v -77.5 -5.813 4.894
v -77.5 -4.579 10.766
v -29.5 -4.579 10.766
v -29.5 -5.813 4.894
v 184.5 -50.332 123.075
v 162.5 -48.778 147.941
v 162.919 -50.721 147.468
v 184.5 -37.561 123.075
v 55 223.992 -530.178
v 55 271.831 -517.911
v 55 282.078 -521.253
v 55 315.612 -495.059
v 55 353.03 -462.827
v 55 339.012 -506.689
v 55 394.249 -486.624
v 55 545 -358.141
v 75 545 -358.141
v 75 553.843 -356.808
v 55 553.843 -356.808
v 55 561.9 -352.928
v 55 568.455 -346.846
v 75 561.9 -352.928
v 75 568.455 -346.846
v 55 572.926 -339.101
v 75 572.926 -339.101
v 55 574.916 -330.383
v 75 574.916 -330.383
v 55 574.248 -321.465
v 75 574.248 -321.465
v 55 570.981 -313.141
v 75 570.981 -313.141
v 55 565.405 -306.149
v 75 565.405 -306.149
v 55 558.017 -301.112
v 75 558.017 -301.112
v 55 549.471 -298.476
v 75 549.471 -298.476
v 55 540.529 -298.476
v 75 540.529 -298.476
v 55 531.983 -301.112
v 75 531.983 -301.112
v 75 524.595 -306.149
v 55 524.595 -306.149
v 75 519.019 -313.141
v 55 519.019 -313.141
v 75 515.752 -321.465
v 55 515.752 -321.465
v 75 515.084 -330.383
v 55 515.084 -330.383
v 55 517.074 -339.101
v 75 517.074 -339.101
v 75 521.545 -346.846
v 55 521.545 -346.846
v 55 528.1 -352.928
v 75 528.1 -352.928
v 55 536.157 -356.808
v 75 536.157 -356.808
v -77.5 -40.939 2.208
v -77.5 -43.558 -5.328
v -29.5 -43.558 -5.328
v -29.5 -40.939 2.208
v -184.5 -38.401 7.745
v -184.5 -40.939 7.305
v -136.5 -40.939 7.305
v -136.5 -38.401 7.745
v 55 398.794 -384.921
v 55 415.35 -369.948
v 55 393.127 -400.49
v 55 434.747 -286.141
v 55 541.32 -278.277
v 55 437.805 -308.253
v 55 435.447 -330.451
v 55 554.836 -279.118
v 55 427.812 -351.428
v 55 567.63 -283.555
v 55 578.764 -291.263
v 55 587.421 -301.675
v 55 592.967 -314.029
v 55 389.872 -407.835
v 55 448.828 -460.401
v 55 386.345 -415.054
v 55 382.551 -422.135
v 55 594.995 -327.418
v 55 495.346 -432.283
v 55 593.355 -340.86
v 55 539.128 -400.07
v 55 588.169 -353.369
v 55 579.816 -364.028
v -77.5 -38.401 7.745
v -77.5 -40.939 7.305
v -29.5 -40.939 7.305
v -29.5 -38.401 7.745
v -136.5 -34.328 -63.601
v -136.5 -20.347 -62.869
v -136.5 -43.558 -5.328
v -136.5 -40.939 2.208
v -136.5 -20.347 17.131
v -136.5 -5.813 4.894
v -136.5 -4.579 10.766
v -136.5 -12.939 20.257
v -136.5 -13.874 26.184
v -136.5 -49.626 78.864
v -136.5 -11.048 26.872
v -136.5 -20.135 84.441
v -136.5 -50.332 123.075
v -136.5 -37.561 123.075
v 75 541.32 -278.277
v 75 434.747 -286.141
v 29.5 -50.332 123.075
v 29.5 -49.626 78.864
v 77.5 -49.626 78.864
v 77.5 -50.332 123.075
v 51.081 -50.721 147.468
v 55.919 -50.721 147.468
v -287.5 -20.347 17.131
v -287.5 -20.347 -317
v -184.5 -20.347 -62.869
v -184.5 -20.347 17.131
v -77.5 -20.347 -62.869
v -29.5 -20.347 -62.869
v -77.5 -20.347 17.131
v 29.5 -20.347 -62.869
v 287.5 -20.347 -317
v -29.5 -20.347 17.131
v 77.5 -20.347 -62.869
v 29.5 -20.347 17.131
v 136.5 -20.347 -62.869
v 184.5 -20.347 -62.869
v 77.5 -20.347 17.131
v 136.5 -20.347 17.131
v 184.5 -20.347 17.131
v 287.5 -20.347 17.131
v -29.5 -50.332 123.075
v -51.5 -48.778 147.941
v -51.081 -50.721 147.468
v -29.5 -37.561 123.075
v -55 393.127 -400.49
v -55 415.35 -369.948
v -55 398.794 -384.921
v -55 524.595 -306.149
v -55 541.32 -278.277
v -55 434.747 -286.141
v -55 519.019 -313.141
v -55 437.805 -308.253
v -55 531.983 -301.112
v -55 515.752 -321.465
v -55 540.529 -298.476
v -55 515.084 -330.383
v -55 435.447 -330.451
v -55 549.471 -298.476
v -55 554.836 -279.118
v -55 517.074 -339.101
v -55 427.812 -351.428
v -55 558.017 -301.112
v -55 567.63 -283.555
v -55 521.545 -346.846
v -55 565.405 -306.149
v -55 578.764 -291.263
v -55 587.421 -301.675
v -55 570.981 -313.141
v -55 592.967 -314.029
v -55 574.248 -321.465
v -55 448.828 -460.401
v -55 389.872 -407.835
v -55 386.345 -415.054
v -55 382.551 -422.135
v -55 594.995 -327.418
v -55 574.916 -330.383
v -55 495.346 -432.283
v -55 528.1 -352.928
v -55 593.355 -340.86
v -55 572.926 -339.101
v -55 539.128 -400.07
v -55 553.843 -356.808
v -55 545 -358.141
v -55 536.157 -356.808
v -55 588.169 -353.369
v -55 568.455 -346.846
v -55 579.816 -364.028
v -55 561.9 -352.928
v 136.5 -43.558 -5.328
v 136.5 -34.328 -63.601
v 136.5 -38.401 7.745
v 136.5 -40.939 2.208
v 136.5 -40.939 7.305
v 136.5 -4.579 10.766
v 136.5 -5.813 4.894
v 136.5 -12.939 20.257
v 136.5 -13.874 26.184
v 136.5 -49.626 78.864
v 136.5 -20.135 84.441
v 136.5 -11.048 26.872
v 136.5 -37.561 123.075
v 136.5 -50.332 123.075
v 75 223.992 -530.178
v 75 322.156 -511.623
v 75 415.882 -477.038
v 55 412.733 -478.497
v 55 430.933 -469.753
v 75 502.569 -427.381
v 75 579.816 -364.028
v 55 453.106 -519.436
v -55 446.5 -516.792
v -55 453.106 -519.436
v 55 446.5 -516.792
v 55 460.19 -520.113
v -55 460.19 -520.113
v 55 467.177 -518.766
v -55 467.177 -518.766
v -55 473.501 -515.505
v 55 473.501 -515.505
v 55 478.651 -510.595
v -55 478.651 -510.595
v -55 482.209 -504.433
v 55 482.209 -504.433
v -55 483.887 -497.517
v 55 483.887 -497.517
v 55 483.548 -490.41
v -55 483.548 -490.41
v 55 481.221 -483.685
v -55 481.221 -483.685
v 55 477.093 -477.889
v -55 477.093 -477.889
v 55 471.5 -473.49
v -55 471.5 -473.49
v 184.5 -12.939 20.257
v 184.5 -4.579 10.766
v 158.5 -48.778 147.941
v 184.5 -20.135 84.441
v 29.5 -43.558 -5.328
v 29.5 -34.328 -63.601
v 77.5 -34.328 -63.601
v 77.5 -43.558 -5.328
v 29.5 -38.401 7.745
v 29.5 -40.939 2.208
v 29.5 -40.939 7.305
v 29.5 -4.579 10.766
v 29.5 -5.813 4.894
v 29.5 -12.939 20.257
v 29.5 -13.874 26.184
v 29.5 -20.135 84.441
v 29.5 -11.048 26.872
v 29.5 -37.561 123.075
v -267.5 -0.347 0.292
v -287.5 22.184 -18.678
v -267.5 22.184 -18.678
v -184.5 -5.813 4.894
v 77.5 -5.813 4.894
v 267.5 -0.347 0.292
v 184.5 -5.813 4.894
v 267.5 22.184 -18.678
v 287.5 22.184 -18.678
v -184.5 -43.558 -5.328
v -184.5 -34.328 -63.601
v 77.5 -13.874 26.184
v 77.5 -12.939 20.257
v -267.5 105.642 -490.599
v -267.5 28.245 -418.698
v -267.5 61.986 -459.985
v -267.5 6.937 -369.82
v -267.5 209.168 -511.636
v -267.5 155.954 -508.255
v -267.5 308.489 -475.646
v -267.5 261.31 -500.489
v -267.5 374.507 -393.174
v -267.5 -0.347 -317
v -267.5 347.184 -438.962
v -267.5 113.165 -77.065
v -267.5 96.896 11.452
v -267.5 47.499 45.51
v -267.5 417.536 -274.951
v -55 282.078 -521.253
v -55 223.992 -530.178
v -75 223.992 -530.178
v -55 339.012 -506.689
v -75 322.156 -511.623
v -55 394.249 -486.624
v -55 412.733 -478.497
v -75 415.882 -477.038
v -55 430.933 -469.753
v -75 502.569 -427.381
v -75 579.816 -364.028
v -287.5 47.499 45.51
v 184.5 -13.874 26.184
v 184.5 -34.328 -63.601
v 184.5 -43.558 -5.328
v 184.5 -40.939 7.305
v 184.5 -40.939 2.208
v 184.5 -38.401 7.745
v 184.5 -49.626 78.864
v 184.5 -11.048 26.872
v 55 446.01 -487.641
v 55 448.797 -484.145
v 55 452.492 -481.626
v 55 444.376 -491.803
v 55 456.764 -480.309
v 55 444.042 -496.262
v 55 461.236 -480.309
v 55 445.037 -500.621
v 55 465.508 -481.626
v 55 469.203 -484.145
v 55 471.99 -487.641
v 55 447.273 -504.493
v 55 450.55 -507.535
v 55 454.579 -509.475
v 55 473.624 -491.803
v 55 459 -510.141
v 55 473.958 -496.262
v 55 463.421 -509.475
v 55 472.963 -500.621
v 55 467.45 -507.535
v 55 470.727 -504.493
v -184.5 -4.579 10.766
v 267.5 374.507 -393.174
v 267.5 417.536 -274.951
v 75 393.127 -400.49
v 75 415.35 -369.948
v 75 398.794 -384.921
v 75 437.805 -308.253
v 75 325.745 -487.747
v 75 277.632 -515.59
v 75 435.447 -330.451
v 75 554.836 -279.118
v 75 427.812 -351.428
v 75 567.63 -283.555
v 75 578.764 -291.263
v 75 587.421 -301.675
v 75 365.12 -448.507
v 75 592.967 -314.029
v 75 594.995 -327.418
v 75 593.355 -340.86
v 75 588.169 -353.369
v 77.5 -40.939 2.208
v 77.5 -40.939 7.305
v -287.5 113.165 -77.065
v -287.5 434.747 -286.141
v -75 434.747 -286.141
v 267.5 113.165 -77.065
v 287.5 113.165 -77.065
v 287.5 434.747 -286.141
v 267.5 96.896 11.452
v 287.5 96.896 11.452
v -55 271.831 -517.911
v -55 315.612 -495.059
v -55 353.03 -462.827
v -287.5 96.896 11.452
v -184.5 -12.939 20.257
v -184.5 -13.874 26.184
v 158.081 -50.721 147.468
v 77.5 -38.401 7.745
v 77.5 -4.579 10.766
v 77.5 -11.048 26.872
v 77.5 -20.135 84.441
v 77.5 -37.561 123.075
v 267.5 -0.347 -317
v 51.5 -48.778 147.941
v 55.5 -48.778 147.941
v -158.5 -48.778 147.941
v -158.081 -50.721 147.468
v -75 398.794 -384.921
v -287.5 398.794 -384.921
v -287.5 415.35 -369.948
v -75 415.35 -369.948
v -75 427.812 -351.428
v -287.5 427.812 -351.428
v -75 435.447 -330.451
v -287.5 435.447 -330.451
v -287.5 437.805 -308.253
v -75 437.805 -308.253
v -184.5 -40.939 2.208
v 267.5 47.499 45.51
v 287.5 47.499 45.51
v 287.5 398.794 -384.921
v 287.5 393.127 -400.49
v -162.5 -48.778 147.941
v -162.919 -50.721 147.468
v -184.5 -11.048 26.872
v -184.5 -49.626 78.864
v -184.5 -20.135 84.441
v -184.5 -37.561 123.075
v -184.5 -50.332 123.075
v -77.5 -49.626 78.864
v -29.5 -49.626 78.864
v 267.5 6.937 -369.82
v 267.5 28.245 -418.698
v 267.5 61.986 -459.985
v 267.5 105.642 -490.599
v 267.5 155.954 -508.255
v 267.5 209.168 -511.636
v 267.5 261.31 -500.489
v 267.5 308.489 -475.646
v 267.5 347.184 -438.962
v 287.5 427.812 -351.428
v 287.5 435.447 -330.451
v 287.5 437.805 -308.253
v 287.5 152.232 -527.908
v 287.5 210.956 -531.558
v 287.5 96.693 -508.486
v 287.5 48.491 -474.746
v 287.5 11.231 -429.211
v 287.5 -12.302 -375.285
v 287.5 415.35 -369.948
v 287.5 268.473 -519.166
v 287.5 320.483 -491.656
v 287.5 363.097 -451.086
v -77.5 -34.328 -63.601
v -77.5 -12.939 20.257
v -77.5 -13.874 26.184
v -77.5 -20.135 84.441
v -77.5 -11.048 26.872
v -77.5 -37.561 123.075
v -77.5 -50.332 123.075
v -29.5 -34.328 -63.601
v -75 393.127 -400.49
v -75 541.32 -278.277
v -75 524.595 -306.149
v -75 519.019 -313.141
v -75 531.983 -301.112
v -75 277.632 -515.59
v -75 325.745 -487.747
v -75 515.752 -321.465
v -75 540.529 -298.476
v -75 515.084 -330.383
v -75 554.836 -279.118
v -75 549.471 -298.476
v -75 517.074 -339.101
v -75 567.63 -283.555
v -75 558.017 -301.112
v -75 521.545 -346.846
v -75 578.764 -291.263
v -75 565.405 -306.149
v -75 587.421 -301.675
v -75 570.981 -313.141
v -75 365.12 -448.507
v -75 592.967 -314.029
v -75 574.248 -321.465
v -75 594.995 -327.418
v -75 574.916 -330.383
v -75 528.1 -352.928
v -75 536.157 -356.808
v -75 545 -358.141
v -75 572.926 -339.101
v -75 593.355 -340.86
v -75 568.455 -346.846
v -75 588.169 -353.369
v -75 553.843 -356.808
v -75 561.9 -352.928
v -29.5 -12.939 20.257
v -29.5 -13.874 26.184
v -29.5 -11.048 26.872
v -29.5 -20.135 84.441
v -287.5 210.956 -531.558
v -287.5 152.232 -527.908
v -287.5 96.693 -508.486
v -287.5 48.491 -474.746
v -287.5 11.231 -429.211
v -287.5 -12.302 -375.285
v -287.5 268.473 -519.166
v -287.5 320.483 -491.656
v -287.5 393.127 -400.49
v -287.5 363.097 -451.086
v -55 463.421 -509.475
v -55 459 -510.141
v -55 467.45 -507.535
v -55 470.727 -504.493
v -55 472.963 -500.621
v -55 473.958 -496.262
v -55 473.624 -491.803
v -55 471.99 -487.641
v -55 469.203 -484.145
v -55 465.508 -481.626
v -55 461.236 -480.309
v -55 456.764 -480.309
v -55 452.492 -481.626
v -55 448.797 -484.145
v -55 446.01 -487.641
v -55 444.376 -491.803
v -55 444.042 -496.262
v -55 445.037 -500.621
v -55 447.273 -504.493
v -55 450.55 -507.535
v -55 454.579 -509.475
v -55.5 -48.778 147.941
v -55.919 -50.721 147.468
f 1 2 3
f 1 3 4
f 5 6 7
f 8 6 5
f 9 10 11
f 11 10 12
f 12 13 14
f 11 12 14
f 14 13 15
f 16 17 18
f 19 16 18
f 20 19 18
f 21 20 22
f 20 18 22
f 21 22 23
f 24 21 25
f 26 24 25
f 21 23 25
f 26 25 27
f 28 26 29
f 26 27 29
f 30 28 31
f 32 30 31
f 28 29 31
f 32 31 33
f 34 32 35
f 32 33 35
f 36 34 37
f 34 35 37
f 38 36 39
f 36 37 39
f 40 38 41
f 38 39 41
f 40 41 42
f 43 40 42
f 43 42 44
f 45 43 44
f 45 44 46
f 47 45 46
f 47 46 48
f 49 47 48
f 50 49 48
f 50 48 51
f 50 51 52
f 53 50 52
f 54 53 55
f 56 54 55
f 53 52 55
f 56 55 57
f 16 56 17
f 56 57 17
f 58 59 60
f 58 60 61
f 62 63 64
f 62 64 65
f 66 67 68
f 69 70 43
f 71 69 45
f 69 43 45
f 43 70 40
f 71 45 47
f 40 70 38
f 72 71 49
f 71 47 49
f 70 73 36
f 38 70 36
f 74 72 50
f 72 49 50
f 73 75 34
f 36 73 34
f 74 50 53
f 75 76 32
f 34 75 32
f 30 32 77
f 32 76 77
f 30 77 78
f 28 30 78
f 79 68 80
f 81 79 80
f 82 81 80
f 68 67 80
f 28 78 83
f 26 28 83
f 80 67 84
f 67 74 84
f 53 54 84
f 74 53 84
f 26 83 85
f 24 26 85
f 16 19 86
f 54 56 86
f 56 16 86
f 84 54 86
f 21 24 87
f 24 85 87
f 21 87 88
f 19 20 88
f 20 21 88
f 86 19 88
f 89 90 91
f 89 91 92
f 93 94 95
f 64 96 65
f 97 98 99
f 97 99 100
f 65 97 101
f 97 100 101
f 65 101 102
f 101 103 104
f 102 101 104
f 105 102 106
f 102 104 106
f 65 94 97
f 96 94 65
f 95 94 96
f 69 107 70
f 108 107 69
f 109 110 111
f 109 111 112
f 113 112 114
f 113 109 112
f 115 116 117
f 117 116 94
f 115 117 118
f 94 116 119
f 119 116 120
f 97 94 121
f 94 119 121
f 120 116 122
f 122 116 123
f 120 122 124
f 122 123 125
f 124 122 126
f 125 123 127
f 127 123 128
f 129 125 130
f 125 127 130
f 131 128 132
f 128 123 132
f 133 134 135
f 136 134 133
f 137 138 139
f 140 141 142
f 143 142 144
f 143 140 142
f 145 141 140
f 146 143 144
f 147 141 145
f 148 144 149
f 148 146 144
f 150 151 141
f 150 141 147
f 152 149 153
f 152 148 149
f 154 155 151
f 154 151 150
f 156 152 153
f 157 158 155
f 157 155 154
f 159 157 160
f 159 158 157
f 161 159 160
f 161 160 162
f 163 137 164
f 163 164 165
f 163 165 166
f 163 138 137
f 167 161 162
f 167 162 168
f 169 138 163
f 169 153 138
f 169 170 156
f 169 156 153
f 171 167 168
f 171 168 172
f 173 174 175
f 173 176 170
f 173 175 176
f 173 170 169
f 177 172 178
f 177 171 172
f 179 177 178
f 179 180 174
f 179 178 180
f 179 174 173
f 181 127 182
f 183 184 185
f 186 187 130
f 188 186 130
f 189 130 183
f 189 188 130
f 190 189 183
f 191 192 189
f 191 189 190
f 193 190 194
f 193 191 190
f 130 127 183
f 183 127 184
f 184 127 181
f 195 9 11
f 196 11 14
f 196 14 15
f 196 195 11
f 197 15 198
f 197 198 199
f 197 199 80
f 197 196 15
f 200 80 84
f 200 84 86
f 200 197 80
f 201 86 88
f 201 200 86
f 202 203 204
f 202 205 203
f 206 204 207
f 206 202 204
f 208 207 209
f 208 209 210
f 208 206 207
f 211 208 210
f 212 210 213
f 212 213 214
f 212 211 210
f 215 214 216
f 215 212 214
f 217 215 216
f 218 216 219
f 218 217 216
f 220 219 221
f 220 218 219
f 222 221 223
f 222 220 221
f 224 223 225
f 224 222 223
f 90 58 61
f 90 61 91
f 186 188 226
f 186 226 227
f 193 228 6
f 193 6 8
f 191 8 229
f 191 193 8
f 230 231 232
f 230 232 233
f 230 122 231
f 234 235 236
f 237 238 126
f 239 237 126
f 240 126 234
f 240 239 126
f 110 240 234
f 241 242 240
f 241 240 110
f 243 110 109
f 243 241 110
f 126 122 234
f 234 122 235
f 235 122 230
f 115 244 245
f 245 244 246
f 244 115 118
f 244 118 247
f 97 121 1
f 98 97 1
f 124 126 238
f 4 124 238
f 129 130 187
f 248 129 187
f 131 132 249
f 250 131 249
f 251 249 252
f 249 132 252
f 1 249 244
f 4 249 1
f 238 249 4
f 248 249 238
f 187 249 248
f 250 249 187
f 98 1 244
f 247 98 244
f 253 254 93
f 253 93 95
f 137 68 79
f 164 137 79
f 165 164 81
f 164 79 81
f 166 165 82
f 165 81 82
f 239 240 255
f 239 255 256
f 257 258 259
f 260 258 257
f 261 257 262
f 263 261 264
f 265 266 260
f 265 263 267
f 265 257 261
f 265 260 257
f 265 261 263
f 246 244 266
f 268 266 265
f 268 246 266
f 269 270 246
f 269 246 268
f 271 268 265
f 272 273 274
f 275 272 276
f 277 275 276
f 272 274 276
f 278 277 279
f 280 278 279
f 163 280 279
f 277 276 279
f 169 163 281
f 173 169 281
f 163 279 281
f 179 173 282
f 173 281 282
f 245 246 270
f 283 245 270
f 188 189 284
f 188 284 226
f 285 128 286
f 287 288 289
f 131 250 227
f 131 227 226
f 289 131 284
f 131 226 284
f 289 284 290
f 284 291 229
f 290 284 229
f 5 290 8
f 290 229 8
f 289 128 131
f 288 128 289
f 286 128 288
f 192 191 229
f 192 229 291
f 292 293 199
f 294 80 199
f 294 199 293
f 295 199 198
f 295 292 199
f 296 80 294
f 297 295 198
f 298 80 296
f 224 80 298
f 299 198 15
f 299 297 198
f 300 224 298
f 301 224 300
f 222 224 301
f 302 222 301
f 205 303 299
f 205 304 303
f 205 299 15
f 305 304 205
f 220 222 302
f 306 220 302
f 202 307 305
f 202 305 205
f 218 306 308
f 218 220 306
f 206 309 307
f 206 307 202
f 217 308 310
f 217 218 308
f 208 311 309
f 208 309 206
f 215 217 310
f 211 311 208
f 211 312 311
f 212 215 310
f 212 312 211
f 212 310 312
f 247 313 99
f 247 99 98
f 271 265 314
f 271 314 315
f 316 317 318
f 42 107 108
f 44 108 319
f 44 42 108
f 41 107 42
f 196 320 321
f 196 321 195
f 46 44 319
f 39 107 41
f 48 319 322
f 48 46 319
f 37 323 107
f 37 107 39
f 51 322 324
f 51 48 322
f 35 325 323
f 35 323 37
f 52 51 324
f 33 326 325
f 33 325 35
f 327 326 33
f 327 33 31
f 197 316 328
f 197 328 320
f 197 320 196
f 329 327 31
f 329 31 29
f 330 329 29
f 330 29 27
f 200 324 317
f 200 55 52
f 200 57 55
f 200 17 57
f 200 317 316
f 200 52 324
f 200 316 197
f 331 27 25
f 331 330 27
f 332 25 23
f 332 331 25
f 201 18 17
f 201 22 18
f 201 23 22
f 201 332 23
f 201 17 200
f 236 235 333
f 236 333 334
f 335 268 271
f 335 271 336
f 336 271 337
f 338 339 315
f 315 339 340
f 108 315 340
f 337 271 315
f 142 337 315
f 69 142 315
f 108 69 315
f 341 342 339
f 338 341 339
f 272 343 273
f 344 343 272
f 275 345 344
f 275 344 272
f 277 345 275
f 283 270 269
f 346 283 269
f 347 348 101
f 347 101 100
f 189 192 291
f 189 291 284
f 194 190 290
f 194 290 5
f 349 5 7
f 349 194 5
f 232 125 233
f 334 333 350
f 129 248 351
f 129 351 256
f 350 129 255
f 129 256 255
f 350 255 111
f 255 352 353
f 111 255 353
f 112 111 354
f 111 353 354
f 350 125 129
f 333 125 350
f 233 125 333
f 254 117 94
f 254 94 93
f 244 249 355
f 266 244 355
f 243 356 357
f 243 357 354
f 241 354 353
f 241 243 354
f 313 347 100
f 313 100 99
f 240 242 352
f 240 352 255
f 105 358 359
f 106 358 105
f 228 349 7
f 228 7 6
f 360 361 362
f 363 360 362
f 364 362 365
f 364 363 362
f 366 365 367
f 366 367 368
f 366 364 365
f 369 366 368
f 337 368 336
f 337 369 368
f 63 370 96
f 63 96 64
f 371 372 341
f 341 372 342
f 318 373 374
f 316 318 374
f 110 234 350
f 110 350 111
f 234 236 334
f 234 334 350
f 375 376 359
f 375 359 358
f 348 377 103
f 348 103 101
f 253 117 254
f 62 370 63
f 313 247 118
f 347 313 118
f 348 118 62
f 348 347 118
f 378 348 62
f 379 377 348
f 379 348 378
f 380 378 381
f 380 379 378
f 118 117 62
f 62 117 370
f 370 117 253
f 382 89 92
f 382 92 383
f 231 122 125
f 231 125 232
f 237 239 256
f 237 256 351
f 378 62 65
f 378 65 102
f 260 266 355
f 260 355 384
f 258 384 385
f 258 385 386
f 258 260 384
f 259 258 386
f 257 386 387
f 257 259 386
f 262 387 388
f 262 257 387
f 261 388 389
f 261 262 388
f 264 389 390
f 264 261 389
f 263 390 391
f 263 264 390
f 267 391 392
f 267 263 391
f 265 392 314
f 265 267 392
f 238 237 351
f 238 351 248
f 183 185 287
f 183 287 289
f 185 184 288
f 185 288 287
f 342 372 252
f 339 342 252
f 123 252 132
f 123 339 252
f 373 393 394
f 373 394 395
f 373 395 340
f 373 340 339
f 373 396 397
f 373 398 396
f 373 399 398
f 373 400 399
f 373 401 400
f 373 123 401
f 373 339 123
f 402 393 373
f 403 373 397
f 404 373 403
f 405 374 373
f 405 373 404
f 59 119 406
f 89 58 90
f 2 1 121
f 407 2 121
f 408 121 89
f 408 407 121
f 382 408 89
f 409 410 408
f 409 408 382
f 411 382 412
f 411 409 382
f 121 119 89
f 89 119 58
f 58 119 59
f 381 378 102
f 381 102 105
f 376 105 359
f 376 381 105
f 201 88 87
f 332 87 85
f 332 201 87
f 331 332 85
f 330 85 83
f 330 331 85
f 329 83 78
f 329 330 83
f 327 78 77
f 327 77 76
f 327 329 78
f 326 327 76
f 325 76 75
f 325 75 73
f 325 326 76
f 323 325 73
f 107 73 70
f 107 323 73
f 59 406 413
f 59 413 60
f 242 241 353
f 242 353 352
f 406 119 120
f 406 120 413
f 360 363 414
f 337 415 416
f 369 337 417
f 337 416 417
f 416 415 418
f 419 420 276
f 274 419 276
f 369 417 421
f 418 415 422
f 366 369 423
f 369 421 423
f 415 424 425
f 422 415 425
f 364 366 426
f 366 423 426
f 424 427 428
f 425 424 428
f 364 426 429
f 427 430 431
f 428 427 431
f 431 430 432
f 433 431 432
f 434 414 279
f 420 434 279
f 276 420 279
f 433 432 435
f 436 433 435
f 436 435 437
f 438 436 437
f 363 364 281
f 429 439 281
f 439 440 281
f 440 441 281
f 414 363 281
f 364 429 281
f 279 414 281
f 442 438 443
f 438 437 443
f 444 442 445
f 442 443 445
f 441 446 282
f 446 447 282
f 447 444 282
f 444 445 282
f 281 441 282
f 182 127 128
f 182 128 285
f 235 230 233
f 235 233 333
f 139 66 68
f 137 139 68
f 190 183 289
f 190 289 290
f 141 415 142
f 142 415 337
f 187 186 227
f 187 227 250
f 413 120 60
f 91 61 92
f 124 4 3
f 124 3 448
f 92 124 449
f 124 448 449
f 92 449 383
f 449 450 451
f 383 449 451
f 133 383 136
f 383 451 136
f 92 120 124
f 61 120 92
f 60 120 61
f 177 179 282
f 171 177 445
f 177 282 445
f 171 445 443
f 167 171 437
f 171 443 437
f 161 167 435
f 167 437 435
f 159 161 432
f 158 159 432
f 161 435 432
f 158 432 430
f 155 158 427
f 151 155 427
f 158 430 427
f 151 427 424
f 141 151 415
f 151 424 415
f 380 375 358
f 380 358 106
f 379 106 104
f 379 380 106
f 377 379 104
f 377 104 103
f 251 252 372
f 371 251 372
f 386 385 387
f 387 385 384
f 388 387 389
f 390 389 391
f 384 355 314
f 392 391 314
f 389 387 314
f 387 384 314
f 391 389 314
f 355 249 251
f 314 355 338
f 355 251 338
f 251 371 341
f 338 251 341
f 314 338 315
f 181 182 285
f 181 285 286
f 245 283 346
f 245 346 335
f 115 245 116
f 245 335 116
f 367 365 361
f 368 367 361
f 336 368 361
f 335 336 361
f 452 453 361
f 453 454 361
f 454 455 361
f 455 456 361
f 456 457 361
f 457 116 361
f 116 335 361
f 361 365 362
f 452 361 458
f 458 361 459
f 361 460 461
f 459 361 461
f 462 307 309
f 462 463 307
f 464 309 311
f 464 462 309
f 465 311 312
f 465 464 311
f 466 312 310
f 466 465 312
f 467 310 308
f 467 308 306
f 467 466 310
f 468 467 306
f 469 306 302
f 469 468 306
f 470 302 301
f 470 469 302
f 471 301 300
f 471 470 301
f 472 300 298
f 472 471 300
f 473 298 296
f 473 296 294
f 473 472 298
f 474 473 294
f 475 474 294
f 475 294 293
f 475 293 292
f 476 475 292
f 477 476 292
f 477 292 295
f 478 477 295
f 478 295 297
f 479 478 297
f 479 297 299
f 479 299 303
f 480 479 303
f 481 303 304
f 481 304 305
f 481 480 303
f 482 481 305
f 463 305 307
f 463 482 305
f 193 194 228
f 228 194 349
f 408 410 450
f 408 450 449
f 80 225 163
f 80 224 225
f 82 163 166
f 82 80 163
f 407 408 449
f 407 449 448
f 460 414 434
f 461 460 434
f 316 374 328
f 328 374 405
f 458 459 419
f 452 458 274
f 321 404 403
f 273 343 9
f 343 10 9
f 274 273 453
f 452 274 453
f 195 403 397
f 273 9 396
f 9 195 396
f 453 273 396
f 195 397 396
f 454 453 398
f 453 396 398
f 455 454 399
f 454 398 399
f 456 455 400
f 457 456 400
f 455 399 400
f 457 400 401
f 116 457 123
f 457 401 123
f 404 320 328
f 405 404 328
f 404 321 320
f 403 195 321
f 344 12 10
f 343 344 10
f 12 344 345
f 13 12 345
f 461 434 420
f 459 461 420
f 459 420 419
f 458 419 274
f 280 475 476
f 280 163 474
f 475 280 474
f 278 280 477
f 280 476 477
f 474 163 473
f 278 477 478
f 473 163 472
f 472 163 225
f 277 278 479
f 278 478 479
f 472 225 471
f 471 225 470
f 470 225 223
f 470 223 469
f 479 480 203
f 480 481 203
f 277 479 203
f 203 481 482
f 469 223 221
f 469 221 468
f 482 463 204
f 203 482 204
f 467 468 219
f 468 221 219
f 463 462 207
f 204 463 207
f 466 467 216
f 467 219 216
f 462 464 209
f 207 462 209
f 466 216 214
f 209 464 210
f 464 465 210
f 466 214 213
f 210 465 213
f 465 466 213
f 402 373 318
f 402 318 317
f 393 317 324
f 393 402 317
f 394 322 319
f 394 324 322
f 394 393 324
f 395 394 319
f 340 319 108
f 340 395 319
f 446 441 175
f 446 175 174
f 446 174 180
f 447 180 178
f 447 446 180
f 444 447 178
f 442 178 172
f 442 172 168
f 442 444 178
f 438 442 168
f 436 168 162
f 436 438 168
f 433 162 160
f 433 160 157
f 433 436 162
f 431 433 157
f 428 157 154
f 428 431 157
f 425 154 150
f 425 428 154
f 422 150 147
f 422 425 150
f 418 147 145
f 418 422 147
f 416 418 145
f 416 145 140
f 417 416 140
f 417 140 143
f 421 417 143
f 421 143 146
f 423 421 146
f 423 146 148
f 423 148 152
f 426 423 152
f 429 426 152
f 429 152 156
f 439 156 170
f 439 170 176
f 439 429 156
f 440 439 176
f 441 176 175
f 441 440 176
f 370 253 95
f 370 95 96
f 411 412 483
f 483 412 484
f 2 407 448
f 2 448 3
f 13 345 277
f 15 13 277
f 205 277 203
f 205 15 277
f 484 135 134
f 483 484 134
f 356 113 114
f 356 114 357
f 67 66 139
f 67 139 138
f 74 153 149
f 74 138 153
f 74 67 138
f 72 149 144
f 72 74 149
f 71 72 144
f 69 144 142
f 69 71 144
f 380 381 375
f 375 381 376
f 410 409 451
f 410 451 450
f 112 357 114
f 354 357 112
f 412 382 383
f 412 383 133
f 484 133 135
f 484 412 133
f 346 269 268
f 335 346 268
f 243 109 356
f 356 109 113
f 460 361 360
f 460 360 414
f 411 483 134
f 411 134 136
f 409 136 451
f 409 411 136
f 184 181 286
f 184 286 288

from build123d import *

# Parameters (mm, degrees)
BOSS_EXTRUDE2_DEPTH = 287.5
SHELL1_START        = -267.5
SHELL1_DEPTH        = 535
SKETCH4_R           = 15
BOSS_EXTRUDE3_DEPTH = 55
BOSS_EXTRUDE4_DEPTH = 287.5
BOSS_EXTRUDE5_START = 75
SKETCH6_R           = 30
BOSS_EXTRUDE5_DEPTH = 20
BOSS_EXTRUDE6_DEPTH = 48
CUT_EXTRUDE1_DEPTH  = 849.457518617
LPATTERN1_COUNT     = 4
LPATTERN1_PITCH     = 107


# Read off the part's stored shape, not the designer's step: Shell1
with BuildPart() as part:
    # Sketch1 → Boss-Extrude2 (new, symmetric)
    with BuildSketch(Plane(origin=(0, 0, 0), x_dir=(0, 0, -1), z_dir=(1, 0, 0))):
        with BuildLine():
            Line((-17.131272745, -20.34711833), (18.677931789, 22.184112876))
            Line((18.677931789, 22.184112876), (-45.510379426, 47.499339584))
            Line((-45.510379426, 47.499339584), (-11.452124758, 96.896052925))
            Line((-11.452124758, 96.896052925), (77.065235948, 113.164945136))
            Line((77.065235948, 113.164945136), (286.140990264, 434.746925642))
            Line((286.140990264, 434.746925642), (400.489865708, 393.127338659))
            ThreePointArc((400.489865708, 393.127338659), (527.907623498, 152.23232826), (317, -20.34711833))
            Line((317, -20.34711833), (-17.131272745, -20.34711833))
        make_face()
    extrude(amount=BOSS_EXTRUDE2_DEPTH, both=True)

    # Shell1 outline → Shell1 (cut)
    with BuildSketch(Plane.YZ.offset(SHELL1_START)):
        with BuildLine():
            Line((-0.34711833, 0.292256559), (-0.347118332, -316.999753995))
            ThreePointArc((-0.347118332, -316.999753995), (155.954494492, -508.255406969), (374.506719993, -393.173507026))
            Line((374.506719993, -393.173507026), (417.536054052, -274.951383325))
            Line((417.536054052, -274.951383325), (113.164945136, -77.065235948))
            Line((113.164945136, -77.065235948), (96.896052925, 11.452124758))
            Line((96.896052925, 11.452124758), (47.499339584, 45.510379426))
            Line((47.499339584, 45.510379426), (22.184112876, -18.677931789))
            Line((22.184112876, -18.677931789), (-0.34711833, 0.292256559))
        make_face()
    extrude(amount=SHELL1_DEPTH, mode=Mode.SUBTRACT)

    # Sketch4 → Boss-Extrude3 (add, symmetric)
    with BuildSketch(Plane(origin=(0, 0, 0), x_dir=(0, 0, -1), z_dir=(1, 0, 0))):
        with BuildLine():
            Line((473.490355169, 471.5), (422.135414248, 382.550633104))
            ThreePointArc((422.135414248, 382.550633104), (443.346279027, 368.983010842), (462.826942921, 353.030428204))
            Line((462.826942921, 353.030428204), (516.791625358, 446.5))
            ThreePointArc((516.791625358, 446.5), (507.640990264, 480.650635095), (473.490355169, 471.5))
        make_face()
        with Locations((495.140990264, 459)):
            Circle(SKETCH4_R, mode=Mode.SUBTRACT)
    extrude(amount=BOSS_EXTRUDE3_DEPTH, both=True)

    # Sketch5 → Boss-Extrude4 (add, symmetric)
    with BuildSketch(Plane(origin=(0, 0, 0), x_dir=(0, 0, -1), z_dir=(1, 0, 0))):
        with BuildLine():
            Line((286.140990264, 434.746925642), (384.921412729, 398.793792137))
            ThreePointArc((384.921412729, 398.793792137), (341.171815777, 432.267819258), (286.140990264, 434.746925642))
        make_face()
    extrude(amount=BOSS_EXTRUDE4_DEPTH, both=True)

    # Sketch6 → Boss-Extrude5 (add)
    with BuildSketch(Plane(origin=(0, 0, 0), x_dir=(0, 0, -1), z_dir=(1, 0, 0)).offset(BOSS_EXTRUDE5_START)):
        with BuildLine():
            ThreePointArc((364.02781167, 579.815744274), (307.663748085, 590.61449937), (278.276573516, 541.320333932))
            Line((278.276573516, 541.320333932), (286.140990264, 434.746925642))
            ThreePointArc((286.140990264, 434.746925642), (341.171815777, 432.267819258), (384.921412729, 398.793792137))
            Line((384.921412729, 398.793792137), (400.489865708, 393.127338659))
            ThreePointArc((400.489865708, 393.127338659), (487.746891868, 325.745206641), (530.177667873, 223.99173212))
            ThreePointArc((530.177667873, 223.99173212), (477.038065131, 415.881856126), (364.02781167, 579.815744274))
        make_face()
        with Locations((328.140990264, 545)):
            Circle(SKETCH6_R, mode=Mode.SUBTRACT)
    boss_extrude5 = extrude(amount=-BOSS_EXTRUDE5_DEPTH)

    # Mirror1: Boss-Extrude5 across plane
    add(boss_extrude5.mirror(Plane(origin=(0, 0, 0), x_dir=(0, 0, 1), z_dir=(1, 0, 0))))

    # Sketch9 → Boss-Extrude6 (add)
    with BuildSketch(Plane(origin=(-184.5, 0, 0), x_dir=(0, 0, -1), z_dir=(1, 0, 0))):
        Polygon((-2.207998194, -40.938965281), (-7.30496659, -40.938965281), (-7.744921849, -38.400642166), (-78.864458205, -49.626128726), (-147.468055977, -50.72115136), (-147.941109389, -48.777901384), (-84.440877624, -20.13490752), (-26.871687982, -11.048203673), (-26.183722798, -13.874286929), (-20.257094768, -12.938829716), (-10.765705608, -4.578537278), (-4.89400709, -5.81269955), (-17.131272745, -20.34711833), (62.868727255, -20.34711833), (63.601430642, -34.327931817), (5.327818547, -43.557565254), align=None)
    boss_extrude6 = extrude(amount=BOSS_EXTRUDE6_DEPTH)

    # Sketch10 → Cut-Extrude1 (cut, symmetric)
    with BuildSketch(Plane(origin=(0, 0, 0), x_dir=(1, 0, 0), z_dir=(0, 1, 0))):
        Polygon((-184.5, -123.07463289), (-162.5, -147.941109389), (-184.5, -147.941109389), align=None)
        Polygon((-158.5, -147.941109389), (-136.5, -123.07463289), (-136.5, -147.941109389), align=None)
    cut_extrude1 = extrude(amount=CUT_EXTRUDE1_DEPTH, both=True, mode=Mode.SUBTRACT)

    # LPattern1: Boss-Extrude6, Cut-Extrude1 ×4
    with Locations(*[(i * LPATTERN1_PITCH, 0, 0) for i in range(1, LPATTERN1_COUNT)]):
        add(boss_extrude6)
        add(cut_extrude1, mode=Mode.SUBTRACT)


solid = part.part
